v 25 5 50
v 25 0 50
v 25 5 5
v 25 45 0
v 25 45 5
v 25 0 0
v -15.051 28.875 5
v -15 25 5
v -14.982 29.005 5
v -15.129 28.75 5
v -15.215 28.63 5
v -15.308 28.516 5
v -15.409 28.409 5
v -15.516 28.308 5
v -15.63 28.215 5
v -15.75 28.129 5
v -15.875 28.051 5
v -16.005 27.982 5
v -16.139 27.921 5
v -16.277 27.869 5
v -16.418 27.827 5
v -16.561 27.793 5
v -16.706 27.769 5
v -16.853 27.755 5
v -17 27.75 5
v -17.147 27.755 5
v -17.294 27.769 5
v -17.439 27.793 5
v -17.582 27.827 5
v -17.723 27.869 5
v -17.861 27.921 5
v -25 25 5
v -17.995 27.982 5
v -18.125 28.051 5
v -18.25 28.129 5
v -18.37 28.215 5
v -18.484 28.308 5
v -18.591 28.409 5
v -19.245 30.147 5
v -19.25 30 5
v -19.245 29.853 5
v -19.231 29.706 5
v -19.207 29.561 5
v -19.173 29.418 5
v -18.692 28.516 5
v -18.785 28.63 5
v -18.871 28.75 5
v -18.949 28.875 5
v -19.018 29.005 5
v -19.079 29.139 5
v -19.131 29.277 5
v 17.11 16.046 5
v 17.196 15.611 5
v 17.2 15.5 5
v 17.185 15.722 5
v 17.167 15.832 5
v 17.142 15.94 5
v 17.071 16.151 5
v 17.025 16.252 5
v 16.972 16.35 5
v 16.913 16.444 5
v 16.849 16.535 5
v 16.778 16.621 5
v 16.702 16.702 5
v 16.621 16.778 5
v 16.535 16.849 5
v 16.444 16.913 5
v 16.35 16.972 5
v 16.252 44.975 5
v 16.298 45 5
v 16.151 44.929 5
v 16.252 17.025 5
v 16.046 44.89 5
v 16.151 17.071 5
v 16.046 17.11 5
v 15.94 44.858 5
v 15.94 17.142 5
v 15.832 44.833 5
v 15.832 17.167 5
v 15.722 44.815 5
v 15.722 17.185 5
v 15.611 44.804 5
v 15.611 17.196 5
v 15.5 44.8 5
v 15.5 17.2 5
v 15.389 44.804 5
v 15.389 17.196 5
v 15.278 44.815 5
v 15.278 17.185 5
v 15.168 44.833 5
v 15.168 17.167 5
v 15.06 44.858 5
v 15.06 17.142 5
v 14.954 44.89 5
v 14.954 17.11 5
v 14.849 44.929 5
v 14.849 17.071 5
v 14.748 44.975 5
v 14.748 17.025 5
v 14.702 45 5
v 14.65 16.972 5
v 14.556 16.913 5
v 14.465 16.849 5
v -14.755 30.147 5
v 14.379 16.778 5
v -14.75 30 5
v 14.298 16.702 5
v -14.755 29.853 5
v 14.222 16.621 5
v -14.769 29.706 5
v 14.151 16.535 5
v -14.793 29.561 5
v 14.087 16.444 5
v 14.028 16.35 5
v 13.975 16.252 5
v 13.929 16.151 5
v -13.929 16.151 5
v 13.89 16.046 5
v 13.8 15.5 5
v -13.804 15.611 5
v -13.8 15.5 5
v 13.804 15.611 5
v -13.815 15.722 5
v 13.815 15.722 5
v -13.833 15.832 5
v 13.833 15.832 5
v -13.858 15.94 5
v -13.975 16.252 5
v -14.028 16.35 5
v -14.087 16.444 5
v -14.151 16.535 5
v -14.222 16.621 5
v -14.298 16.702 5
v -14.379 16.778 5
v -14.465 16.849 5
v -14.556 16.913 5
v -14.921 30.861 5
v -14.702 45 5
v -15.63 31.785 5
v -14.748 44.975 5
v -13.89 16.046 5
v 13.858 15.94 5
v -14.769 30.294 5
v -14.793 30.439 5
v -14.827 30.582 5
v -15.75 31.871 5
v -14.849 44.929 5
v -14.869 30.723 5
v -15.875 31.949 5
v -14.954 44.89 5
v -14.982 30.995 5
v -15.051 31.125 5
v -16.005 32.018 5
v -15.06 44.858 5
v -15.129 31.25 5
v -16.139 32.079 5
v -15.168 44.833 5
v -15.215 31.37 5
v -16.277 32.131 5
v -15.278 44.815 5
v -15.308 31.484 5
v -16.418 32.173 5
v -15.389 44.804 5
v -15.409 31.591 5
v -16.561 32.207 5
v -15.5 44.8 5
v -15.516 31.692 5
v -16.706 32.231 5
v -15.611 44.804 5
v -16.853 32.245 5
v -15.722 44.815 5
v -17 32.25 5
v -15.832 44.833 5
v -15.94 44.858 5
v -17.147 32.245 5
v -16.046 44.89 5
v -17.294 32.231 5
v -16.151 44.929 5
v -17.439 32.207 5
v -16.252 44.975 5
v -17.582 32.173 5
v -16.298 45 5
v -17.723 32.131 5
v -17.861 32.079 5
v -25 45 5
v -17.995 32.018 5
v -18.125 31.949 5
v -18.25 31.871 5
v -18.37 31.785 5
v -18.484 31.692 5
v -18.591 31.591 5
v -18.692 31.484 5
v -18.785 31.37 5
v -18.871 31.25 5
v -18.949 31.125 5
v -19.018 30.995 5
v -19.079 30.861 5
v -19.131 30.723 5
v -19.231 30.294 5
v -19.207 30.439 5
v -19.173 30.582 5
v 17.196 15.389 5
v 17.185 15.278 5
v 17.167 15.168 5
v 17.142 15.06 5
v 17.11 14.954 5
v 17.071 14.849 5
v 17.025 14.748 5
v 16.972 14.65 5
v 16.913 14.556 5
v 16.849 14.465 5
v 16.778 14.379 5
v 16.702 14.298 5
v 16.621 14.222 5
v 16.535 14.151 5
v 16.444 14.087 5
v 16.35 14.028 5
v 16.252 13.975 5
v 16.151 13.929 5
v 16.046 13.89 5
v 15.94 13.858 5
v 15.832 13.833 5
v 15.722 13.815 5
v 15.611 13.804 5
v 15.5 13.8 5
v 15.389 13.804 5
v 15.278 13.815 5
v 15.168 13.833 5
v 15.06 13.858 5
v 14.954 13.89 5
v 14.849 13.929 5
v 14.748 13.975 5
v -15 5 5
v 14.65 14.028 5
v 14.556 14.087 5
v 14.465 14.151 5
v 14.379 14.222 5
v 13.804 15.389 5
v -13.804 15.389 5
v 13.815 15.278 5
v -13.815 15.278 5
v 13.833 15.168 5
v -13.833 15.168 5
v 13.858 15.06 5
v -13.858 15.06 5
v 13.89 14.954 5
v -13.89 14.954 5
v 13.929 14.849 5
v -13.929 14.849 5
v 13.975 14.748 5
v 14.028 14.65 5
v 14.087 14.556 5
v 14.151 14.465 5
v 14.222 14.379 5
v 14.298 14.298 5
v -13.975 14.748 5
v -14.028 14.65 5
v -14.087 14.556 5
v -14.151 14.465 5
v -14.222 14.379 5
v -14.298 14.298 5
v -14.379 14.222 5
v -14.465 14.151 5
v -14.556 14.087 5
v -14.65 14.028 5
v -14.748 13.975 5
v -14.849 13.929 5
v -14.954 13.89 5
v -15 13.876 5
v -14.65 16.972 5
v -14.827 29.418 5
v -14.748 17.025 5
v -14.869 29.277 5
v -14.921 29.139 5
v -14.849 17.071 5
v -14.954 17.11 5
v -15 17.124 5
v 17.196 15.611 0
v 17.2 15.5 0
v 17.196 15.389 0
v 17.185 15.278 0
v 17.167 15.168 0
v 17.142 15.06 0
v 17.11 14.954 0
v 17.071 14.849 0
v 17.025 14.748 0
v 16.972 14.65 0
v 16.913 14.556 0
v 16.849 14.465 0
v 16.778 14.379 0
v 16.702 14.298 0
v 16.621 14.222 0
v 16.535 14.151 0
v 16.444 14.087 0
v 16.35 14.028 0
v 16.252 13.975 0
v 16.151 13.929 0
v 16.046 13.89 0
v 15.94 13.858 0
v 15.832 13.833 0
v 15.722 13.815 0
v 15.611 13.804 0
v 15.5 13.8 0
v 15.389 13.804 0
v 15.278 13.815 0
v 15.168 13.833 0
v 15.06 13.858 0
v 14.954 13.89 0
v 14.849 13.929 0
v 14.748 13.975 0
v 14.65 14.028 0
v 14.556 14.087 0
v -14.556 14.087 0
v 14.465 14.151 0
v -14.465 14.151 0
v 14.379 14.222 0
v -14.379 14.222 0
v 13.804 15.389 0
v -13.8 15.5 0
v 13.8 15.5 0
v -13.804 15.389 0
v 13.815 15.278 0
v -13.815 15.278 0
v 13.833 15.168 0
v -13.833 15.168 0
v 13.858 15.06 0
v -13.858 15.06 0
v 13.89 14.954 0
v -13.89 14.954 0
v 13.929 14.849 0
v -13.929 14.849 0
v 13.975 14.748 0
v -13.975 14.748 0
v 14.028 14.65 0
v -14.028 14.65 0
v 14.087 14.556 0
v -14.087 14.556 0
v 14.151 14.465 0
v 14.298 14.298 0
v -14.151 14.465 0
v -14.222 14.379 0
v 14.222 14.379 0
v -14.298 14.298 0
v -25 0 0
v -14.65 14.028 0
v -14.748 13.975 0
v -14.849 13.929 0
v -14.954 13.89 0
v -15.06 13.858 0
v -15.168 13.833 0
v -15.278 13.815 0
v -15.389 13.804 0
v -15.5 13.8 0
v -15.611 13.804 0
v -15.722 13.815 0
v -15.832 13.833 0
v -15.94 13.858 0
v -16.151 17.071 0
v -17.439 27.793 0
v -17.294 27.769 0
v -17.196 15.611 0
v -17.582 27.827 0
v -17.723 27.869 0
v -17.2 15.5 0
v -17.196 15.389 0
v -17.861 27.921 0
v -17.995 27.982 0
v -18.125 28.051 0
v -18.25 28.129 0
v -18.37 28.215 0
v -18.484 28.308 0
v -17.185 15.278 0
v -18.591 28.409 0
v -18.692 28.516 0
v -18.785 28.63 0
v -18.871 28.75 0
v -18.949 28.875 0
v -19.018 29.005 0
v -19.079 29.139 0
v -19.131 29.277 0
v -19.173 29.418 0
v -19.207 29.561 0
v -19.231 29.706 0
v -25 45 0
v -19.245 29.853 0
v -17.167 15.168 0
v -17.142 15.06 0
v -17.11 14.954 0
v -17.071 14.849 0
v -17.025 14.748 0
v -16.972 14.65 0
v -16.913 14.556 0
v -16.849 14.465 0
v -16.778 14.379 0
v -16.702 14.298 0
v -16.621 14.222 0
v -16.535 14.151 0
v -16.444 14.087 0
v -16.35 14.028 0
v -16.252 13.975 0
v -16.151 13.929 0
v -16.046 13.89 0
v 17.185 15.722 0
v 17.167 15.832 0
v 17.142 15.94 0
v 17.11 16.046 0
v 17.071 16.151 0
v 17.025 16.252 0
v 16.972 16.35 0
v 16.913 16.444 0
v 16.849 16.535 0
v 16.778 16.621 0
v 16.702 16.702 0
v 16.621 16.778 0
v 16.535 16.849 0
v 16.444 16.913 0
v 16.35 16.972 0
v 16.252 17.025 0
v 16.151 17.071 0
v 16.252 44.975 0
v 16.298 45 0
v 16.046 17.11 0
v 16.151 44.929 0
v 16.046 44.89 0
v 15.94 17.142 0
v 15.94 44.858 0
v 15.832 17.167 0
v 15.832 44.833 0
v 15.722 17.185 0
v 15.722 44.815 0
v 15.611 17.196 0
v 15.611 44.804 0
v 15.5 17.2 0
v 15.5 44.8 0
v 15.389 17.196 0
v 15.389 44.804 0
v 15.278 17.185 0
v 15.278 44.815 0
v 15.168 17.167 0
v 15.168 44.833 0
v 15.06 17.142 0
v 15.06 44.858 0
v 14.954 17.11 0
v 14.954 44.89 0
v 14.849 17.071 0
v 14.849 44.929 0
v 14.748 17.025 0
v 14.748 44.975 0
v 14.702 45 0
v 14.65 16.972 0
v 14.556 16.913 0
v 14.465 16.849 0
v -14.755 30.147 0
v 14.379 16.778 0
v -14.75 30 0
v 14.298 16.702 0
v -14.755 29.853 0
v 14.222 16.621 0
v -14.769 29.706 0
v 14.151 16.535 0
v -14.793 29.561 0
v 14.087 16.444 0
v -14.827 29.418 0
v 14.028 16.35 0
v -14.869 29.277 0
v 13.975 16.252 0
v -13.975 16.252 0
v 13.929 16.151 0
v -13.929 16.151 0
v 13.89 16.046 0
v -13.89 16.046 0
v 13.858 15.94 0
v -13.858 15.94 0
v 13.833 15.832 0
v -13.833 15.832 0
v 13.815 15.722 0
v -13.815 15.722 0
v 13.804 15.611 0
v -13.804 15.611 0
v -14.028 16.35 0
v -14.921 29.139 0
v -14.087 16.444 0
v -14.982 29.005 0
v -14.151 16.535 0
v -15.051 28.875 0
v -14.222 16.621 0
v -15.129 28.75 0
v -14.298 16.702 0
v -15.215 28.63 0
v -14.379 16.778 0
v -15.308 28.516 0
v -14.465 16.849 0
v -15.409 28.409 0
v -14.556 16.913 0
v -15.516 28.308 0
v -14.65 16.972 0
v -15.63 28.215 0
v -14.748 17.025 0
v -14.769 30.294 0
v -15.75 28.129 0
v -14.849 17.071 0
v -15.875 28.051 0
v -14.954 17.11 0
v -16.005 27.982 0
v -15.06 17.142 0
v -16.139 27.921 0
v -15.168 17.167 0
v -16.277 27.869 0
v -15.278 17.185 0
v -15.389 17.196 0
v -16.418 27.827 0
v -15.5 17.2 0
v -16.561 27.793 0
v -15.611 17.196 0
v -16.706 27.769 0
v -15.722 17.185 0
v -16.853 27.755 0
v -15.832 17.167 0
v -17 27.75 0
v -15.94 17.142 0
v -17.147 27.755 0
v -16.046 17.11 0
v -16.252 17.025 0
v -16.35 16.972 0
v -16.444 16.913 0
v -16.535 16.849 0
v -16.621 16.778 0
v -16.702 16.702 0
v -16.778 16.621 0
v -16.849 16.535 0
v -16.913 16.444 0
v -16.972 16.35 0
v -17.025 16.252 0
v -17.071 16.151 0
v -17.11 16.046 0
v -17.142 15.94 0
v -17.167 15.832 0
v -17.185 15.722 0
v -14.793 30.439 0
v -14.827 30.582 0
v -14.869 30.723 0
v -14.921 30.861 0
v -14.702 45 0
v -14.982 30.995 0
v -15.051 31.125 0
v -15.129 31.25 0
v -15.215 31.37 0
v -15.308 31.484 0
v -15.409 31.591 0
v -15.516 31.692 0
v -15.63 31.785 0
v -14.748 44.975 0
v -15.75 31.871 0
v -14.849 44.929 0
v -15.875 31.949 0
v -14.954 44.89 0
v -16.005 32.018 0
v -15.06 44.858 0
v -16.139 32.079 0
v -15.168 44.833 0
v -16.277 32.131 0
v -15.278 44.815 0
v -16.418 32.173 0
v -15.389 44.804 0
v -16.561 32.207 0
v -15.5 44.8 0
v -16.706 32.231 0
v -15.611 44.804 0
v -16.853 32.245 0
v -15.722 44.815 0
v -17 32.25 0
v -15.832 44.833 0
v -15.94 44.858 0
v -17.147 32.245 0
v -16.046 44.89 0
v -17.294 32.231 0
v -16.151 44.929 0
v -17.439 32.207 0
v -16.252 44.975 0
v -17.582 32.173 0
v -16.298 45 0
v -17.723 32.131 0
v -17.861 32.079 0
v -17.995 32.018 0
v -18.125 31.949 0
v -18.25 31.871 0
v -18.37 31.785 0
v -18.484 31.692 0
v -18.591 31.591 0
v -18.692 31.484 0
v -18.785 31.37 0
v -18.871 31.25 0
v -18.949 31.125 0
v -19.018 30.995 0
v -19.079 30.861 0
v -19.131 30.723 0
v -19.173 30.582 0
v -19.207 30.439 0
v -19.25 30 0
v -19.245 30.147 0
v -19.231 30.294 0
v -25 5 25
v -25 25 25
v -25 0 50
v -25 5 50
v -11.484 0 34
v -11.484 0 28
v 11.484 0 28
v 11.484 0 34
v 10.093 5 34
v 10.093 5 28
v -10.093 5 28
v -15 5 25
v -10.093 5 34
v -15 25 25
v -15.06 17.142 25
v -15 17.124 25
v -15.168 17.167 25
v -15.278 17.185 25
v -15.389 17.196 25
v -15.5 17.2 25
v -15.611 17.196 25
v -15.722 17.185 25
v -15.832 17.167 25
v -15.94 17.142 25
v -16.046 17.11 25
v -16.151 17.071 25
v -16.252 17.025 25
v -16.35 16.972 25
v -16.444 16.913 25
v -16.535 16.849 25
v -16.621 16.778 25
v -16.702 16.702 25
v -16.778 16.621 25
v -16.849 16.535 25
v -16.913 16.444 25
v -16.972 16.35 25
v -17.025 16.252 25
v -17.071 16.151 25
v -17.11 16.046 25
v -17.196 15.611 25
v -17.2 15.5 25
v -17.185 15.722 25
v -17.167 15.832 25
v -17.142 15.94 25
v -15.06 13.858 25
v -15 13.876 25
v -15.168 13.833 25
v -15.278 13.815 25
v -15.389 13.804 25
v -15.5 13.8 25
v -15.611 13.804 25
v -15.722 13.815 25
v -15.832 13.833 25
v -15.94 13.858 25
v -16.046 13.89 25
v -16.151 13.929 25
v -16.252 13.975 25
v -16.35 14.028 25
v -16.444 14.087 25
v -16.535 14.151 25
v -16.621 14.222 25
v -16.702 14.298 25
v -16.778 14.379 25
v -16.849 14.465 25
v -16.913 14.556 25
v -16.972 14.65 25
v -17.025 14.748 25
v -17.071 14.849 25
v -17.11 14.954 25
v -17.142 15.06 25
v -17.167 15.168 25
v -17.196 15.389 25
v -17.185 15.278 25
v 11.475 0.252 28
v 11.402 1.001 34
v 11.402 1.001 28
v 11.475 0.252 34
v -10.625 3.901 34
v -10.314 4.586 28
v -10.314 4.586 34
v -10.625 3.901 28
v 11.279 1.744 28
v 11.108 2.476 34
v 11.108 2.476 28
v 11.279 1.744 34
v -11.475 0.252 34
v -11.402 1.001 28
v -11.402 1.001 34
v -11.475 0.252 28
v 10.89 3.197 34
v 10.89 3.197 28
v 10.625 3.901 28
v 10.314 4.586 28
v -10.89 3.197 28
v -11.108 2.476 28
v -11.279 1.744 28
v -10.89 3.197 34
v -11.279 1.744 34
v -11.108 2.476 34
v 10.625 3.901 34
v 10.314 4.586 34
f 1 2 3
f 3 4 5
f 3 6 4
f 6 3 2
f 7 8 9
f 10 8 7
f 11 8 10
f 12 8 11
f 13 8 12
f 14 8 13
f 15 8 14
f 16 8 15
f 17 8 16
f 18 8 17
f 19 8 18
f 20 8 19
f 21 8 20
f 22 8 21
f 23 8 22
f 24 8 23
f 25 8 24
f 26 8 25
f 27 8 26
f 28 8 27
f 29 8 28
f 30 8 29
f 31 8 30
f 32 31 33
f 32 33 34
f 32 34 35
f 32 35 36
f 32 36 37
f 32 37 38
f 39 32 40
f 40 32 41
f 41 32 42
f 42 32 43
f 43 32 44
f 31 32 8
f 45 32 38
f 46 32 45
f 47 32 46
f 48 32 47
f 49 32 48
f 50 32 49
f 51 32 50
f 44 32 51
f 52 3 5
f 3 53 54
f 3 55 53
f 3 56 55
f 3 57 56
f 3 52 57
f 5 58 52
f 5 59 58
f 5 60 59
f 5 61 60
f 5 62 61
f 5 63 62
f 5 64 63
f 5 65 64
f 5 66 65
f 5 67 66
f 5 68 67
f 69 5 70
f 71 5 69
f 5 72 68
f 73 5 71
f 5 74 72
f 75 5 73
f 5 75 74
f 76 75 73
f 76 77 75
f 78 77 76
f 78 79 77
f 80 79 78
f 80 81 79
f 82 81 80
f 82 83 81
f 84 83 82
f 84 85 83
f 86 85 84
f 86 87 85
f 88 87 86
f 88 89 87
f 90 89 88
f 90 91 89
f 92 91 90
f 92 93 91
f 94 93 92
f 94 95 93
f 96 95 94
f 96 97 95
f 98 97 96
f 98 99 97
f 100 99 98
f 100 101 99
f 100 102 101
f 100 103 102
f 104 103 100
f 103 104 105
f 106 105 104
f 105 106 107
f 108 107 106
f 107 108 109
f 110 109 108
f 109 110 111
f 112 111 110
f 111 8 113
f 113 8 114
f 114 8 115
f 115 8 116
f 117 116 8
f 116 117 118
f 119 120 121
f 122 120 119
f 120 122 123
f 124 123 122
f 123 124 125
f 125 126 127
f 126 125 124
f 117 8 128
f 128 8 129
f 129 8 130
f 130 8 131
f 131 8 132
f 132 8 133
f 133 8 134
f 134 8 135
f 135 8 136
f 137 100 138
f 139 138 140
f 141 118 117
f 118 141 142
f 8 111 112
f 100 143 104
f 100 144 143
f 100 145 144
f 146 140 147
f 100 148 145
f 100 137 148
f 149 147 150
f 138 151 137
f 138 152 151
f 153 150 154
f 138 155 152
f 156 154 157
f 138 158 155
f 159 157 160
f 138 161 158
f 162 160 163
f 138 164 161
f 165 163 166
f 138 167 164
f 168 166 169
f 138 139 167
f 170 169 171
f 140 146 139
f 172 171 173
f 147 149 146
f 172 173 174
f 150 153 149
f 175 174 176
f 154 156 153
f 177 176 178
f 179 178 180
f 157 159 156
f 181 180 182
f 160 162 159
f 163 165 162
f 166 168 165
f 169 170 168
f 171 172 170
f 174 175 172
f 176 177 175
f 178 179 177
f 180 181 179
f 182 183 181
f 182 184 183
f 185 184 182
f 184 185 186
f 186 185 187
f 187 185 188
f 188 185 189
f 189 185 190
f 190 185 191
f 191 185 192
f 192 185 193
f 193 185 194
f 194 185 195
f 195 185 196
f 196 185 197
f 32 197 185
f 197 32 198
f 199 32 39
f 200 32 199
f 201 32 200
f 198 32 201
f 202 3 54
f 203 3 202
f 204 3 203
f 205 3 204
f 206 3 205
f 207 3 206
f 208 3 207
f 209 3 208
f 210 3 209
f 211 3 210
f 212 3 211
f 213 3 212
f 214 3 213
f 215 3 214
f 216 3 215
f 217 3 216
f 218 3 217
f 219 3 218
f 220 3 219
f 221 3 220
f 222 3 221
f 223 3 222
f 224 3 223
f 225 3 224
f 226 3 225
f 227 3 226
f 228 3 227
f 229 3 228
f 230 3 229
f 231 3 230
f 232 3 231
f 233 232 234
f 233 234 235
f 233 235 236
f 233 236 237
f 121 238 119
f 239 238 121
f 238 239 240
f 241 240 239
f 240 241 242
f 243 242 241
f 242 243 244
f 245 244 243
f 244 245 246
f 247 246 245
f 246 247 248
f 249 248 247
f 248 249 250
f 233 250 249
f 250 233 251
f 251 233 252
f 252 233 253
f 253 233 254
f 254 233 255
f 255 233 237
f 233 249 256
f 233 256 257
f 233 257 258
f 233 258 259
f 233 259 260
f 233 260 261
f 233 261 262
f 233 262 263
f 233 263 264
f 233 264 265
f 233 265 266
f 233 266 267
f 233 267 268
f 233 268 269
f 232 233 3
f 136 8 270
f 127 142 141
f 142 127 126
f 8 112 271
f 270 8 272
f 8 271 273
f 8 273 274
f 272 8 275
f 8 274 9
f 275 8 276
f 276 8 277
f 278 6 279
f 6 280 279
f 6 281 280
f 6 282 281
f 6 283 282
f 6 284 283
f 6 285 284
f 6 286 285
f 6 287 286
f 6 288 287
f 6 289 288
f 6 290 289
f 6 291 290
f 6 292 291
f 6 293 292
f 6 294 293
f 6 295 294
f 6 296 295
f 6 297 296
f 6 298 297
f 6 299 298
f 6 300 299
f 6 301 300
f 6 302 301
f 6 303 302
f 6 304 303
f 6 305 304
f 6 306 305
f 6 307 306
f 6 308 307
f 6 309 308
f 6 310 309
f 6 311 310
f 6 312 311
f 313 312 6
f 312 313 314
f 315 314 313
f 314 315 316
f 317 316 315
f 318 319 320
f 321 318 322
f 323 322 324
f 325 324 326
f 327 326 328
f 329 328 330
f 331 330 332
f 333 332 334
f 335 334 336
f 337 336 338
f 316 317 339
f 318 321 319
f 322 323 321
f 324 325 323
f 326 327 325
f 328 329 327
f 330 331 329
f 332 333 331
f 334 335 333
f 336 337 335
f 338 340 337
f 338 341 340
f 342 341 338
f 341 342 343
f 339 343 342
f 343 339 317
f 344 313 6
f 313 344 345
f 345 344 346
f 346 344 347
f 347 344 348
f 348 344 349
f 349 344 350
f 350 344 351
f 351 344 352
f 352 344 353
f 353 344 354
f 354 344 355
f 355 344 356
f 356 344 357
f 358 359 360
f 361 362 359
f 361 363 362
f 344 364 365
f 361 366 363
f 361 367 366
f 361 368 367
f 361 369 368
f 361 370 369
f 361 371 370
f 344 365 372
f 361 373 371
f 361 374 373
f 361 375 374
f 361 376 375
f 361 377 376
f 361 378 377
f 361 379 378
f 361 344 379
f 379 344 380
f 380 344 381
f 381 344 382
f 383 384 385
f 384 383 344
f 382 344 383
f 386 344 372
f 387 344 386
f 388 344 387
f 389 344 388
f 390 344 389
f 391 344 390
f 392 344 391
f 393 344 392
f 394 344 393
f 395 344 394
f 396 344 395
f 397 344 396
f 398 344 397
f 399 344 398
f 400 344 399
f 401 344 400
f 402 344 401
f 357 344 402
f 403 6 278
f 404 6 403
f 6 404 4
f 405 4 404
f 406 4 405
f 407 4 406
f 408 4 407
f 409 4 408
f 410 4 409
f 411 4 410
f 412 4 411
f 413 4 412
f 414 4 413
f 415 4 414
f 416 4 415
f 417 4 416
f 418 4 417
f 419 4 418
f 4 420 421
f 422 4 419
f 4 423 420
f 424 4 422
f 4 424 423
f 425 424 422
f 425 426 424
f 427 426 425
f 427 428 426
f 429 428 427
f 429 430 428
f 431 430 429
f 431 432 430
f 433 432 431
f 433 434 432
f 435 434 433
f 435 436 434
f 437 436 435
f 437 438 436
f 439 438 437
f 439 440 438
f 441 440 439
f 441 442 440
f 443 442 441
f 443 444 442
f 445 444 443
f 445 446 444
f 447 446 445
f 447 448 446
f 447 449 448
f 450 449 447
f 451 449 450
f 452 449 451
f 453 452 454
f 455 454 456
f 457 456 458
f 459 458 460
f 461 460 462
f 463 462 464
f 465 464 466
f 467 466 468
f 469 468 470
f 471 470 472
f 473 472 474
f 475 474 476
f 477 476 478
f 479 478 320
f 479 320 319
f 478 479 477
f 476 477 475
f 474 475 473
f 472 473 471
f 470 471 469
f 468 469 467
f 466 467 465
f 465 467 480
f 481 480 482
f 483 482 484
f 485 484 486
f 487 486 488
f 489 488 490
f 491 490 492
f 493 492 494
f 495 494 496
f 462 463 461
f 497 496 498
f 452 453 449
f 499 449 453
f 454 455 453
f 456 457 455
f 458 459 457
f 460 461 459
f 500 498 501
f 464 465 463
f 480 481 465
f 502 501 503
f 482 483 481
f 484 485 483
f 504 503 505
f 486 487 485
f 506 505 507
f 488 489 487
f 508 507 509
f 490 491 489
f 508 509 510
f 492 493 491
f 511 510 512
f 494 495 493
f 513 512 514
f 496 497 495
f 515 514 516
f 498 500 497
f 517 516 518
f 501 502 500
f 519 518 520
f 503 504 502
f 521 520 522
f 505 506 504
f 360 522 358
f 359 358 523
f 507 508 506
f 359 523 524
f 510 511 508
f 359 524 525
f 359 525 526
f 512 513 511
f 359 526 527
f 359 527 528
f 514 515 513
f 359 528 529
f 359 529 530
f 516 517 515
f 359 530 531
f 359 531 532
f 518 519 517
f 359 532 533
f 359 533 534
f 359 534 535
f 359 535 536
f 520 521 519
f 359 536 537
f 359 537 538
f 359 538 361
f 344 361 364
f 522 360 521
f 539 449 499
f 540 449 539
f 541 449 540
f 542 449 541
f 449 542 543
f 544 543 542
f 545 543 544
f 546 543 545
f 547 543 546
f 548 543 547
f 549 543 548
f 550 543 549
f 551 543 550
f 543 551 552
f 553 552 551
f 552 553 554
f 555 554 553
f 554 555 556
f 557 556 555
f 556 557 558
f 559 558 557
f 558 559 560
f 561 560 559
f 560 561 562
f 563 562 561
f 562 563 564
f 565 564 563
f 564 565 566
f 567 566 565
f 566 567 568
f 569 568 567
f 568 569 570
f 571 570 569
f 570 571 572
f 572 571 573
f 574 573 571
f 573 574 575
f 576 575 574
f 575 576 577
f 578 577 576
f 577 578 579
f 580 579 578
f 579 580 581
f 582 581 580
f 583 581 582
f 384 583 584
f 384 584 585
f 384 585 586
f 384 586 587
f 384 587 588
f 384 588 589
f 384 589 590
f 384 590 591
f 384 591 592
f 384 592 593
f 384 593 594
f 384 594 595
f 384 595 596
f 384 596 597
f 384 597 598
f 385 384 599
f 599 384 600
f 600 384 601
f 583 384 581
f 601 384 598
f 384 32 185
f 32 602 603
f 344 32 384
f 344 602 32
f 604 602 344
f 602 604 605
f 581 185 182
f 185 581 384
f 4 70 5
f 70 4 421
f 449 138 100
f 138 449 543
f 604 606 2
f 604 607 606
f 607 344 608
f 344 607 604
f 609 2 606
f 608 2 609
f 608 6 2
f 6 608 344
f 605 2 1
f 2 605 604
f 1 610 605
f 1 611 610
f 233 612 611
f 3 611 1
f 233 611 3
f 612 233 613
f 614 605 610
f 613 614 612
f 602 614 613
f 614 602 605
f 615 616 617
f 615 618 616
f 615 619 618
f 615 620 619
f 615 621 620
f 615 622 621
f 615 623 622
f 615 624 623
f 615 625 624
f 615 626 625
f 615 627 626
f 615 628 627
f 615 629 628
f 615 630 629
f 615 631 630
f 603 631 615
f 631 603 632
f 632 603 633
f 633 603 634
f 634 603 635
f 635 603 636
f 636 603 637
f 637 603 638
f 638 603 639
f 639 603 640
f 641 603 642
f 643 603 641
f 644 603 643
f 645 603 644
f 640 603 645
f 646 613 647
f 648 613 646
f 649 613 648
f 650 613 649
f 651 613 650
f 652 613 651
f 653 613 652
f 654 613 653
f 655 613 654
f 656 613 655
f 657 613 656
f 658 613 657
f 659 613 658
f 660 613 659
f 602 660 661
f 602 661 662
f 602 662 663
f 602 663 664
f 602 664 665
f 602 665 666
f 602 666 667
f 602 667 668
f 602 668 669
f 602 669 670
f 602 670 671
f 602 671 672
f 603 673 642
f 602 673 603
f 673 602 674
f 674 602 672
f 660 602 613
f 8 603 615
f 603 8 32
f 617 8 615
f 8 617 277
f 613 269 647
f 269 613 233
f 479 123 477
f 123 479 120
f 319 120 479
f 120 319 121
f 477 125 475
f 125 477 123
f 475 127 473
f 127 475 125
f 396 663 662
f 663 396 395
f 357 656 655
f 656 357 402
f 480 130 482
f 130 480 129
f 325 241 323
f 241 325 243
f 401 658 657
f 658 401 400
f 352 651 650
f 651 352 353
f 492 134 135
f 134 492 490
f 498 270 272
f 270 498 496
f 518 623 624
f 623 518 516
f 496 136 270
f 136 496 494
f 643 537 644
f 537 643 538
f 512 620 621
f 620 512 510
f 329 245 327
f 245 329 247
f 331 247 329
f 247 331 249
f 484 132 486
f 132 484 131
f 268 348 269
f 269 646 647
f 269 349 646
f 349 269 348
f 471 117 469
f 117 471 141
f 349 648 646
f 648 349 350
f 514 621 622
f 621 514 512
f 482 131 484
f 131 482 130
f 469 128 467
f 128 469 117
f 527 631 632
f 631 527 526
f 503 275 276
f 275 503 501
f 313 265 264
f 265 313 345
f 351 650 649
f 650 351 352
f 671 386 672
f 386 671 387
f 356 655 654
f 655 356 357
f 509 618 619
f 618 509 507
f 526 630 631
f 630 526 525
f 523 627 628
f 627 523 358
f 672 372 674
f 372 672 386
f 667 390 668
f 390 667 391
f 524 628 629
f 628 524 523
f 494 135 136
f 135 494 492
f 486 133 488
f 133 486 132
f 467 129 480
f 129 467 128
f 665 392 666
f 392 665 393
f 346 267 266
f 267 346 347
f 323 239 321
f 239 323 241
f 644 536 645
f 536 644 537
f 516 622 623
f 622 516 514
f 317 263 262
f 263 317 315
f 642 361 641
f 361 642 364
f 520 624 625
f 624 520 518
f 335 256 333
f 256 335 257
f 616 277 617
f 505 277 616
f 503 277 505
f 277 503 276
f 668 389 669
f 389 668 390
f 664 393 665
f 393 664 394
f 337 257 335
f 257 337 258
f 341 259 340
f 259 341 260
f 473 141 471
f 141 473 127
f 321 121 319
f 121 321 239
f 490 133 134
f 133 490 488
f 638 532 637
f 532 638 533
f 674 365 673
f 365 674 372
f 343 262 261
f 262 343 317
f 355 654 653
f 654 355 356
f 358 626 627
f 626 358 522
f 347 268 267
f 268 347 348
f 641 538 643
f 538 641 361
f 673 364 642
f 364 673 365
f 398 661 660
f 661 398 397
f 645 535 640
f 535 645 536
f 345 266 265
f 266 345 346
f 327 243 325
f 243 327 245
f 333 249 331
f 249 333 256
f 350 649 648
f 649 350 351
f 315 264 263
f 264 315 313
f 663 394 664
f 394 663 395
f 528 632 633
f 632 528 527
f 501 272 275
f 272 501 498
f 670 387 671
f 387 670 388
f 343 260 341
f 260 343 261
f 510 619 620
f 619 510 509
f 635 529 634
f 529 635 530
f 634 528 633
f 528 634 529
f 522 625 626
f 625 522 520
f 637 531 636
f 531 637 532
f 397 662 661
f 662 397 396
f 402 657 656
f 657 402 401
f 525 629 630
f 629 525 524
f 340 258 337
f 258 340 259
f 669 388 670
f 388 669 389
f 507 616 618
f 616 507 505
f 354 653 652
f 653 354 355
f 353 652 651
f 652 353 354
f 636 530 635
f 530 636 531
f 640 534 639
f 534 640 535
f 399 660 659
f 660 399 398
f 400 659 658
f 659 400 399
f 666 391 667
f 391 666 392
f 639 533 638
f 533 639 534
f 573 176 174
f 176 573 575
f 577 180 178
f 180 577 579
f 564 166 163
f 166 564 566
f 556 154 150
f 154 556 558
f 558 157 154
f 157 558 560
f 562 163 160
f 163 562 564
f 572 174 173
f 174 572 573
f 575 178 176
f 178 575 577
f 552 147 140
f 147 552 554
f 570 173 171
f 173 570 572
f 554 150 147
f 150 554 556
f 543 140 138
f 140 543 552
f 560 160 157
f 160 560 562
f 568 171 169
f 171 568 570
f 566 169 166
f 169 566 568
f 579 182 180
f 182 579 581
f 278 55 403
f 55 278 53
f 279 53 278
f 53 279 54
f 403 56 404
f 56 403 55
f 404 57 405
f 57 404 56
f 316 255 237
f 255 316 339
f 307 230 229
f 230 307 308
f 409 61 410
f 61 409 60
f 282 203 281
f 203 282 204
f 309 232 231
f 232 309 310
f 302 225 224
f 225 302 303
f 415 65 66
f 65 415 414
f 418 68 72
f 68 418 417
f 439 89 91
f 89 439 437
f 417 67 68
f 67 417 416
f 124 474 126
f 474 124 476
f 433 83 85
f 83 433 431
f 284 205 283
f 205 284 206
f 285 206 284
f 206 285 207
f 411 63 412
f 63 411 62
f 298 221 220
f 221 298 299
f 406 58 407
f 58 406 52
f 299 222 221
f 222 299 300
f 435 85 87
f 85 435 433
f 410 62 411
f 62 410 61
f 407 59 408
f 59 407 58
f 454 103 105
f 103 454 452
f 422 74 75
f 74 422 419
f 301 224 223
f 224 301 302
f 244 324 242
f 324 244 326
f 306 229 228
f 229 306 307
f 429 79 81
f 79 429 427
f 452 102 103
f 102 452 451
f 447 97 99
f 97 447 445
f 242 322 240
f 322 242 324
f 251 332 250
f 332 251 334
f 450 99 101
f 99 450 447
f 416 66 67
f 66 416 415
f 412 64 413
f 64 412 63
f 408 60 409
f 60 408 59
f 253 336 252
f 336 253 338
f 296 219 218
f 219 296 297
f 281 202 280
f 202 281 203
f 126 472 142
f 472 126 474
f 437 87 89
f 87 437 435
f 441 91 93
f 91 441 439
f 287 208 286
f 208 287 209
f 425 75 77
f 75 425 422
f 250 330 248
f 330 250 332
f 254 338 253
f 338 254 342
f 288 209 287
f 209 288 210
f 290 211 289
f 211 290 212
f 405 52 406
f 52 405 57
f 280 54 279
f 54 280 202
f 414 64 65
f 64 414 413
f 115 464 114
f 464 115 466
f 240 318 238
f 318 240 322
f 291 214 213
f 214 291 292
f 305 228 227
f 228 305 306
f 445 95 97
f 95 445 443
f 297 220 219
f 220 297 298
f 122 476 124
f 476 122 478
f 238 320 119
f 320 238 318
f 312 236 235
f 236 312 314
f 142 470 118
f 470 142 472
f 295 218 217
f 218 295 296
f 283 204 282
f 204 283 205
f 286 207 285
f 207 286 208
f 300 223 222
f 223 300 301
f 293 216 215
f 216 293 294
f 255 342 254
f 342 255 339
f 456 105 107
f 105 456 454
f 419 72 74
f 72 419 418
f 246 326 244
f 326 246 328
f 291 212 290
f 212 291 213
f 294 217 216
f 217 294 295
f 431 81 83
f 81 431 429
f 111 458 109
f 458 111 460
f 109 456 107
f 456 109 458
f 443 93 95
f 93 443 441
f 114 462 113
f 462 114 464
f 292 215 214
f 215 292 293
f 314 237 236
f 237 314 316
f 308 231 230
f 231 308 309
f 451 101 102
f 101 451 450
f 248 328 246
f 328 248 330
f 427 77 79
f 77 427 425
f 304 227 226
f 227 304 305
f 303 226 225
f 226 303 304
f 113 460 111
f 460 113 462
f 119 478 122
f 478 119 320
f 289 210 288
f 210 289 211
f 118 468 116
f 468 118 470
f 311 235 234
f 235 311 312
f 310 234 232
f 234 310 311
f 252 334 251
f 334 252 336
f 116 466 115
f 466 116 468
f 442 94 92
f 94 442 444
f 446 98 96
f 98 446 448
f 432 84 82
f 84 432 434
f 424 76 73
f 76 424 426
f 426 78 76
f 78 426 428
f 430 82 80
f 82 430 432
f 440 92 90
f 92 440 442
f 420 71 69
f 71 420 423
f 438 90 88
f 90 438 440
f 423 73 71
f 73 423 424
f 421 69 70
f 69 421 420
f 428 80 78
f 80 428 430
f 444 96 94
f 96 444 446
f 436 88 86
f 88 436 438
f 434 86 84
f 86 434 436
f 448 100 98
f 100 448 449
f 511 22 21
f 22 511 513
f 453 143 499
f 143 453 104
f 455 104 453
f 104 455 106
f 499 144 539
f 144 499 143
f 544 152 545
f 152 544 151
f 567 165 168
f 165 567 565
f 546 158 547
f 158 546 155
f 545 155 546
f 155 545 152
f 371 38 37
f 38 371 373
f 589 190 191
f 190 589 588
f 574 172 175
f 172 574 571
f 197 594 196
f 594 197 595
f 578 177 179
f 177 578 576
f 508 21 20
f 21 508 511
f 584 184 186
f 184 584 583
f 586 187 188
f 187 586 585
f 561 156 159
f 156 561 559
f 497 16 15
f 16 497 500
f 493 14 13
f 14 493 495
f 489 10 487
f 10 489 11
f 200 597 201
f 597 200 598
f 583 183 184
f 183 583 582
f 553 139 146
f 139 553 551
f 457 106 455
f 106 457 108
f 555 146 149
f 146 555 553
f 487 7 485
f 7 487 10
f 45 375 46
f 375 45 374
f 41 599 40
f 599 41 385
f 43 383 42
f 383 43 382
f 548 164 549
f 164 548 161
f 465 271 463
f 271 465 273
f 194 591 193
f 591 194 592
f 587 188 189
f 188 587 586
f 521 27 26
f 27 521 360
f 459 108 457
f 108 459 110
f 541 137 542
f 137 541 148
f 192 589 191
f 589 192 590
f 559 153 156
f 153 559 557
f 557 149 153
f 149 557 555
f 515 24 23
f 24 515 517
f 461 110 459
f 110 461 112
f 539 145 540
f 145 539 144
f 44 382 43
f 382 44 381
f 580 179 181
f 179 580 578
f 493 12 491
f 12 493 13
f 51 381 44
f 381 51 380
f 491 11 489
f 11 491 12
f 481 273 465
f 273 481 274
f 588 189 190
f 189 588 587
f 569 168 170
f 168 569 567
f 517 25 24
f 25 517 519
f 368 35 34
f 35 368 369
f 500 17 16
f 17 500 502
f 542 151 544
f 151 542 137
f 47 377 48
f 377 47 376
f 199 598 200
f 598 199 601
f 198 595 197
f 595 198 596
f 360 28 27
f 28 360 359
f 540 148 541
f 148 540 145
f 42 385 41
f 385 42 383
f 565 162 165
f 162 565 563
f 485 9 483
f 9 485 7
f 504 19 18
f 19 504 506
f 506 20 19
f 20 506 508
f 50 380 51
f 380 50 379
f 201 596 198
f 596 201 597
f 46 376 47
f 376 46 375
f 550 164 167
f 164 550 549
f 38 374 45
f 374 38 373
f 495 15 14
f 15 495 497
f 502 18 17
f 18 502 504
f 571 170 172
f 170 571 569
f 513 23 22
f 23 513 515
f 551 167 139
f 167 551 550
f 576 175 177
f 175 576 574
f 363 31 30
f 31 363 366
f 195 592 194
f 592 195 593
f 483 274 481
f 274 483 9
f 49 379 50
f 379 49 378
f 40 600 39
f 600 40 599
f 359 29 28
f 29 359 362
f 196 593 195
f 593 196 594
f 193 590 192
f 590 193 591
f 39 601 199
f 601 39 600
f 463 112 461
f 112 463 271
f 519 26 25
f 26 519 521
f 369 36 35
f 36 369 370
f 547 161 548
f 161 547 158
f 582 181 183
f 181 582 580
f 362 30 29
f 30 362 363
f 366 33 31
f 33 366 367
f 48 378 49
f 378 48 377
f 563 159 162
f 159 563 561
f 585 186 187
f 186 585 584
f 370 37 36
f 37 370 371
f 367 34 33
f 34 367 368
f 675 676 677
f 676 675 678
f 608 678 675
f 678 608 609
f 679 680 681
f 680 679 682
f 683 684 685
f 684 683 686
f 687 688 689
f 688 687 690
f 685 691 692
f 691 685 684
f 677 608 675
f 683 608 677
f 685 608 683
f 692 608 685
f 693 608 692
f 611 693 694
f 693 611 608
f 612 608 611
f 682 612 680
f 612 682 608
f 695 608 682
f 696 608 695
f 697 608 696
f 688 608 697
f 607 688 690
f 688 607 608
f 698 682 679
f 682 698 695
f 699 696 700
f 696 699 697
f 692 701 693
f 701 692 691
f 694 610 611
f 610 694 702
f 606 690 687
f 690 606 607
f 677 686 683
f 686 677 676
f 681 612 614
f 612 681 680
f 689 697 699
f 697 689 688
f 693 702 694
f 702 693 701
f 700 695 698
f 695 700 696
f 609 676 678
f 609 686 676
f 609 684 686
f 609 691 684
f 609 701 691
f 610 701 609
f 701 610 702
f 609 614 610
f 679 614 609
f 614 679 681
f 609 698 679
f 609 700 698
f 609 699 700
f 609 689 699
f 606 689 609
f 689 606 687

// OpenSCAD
// L-shaped mounting bracket for NEMA 17 stepper motor
// Print orientation: base plate on bed (z = 0), motor plate builds upward (+Z)

// ---------------- Parameters ----------------
base_x0      = -25;    // base plate: x start
base_x1      = 25;     // base plate: x end
base_y0      = 0;      // base plate: y start
base_y1      = 45;     // base plate: y end
base_z0      = 0;      // base plate: z start
base_z1      = 5;      // base plate: z end

hole_x       = -17;    // M4 through-hole x position
hole_y       = 30;     // M4 through-hole y position
hole_d       = 4.5;    // M4 hole diameter

plate_x0     = -25;    // motor plate: x start
plate_x1     = 25;     // motor plate: x end
plate_y0     = 0;      // motor plate: y start
plate_y1     = 5;      // motor plate: y end
plate_z0     = 0;      // motor plate: z start
plate_z1     = 50;     // motor plate: z end

boss_d       = 23;     // motor centring boss hole diameter
boss_x       = 0;      // boss hole centre x
boss_z       = 28;     // boss hole centre z

screw_d      = 3.4;    // M3 screw hole diameter
screw_pat    = 31;     // square pattern side length

gusset_t     = 5;      // gusset thickness (X)
gusset_leg   = 20;     // right triangle leg length (Y and Z)
gusset_x0    = -25;    // left gusset x start
gusset_x1    = -20;    // left gusset x end

eps          = 0.5;    // cutter overshoot past faces

$fn = 96;

// ---------------- Model ----------------
difference() {
    union() {
        // Base plate
        translate([base_x0, base_y0, base_z0])
            cube([base_x1 - base_x0, base_y1 - base_y0, base_z1 - base_z0]);

        // Motor plate
        translate([plate_x0, plate_y0, plate_z0])
            cube([plate_x1 - plate_x0, plate_y1 - plate_y0, plate_z1 - plate_z0]);

        // Left gusset (flush with left edge)
        translate([gusset_x0, 5, 5])
            cube([gusset_t, gusset_leg, gusset_leg]);

        // Right gusset (flush with right edge)
        translate([gusset_x1, 5, 5])
            cube([gusset_t, gusset_leg, gusset_leg]);
    }

    // M4 through-holes in base plate
    translate([hole_x, hole_y, -eps])
        cylinder(d = hole_d, h = base_z1 - base_z0 + 2 * eps);

    // Boss hole through motor plate (along Y)
    translate([boss_x, plate_y0 - eps, boss_z])
        cylinder(d = boss_d, h = plate_y1 - plate_y0 + 2 * eps);

    // M3 screw holes on square pattern centred on boss hole
    for (i = [0 : 3])
        for (j = [0 : 3])
            translate([(i - 1.5) * screw_pat, (j - 1.5) * screw_pat, -eps])
                cylinder(d = screw_d, h = plate_z1 - plate_z0 + 2 * eps);
}
